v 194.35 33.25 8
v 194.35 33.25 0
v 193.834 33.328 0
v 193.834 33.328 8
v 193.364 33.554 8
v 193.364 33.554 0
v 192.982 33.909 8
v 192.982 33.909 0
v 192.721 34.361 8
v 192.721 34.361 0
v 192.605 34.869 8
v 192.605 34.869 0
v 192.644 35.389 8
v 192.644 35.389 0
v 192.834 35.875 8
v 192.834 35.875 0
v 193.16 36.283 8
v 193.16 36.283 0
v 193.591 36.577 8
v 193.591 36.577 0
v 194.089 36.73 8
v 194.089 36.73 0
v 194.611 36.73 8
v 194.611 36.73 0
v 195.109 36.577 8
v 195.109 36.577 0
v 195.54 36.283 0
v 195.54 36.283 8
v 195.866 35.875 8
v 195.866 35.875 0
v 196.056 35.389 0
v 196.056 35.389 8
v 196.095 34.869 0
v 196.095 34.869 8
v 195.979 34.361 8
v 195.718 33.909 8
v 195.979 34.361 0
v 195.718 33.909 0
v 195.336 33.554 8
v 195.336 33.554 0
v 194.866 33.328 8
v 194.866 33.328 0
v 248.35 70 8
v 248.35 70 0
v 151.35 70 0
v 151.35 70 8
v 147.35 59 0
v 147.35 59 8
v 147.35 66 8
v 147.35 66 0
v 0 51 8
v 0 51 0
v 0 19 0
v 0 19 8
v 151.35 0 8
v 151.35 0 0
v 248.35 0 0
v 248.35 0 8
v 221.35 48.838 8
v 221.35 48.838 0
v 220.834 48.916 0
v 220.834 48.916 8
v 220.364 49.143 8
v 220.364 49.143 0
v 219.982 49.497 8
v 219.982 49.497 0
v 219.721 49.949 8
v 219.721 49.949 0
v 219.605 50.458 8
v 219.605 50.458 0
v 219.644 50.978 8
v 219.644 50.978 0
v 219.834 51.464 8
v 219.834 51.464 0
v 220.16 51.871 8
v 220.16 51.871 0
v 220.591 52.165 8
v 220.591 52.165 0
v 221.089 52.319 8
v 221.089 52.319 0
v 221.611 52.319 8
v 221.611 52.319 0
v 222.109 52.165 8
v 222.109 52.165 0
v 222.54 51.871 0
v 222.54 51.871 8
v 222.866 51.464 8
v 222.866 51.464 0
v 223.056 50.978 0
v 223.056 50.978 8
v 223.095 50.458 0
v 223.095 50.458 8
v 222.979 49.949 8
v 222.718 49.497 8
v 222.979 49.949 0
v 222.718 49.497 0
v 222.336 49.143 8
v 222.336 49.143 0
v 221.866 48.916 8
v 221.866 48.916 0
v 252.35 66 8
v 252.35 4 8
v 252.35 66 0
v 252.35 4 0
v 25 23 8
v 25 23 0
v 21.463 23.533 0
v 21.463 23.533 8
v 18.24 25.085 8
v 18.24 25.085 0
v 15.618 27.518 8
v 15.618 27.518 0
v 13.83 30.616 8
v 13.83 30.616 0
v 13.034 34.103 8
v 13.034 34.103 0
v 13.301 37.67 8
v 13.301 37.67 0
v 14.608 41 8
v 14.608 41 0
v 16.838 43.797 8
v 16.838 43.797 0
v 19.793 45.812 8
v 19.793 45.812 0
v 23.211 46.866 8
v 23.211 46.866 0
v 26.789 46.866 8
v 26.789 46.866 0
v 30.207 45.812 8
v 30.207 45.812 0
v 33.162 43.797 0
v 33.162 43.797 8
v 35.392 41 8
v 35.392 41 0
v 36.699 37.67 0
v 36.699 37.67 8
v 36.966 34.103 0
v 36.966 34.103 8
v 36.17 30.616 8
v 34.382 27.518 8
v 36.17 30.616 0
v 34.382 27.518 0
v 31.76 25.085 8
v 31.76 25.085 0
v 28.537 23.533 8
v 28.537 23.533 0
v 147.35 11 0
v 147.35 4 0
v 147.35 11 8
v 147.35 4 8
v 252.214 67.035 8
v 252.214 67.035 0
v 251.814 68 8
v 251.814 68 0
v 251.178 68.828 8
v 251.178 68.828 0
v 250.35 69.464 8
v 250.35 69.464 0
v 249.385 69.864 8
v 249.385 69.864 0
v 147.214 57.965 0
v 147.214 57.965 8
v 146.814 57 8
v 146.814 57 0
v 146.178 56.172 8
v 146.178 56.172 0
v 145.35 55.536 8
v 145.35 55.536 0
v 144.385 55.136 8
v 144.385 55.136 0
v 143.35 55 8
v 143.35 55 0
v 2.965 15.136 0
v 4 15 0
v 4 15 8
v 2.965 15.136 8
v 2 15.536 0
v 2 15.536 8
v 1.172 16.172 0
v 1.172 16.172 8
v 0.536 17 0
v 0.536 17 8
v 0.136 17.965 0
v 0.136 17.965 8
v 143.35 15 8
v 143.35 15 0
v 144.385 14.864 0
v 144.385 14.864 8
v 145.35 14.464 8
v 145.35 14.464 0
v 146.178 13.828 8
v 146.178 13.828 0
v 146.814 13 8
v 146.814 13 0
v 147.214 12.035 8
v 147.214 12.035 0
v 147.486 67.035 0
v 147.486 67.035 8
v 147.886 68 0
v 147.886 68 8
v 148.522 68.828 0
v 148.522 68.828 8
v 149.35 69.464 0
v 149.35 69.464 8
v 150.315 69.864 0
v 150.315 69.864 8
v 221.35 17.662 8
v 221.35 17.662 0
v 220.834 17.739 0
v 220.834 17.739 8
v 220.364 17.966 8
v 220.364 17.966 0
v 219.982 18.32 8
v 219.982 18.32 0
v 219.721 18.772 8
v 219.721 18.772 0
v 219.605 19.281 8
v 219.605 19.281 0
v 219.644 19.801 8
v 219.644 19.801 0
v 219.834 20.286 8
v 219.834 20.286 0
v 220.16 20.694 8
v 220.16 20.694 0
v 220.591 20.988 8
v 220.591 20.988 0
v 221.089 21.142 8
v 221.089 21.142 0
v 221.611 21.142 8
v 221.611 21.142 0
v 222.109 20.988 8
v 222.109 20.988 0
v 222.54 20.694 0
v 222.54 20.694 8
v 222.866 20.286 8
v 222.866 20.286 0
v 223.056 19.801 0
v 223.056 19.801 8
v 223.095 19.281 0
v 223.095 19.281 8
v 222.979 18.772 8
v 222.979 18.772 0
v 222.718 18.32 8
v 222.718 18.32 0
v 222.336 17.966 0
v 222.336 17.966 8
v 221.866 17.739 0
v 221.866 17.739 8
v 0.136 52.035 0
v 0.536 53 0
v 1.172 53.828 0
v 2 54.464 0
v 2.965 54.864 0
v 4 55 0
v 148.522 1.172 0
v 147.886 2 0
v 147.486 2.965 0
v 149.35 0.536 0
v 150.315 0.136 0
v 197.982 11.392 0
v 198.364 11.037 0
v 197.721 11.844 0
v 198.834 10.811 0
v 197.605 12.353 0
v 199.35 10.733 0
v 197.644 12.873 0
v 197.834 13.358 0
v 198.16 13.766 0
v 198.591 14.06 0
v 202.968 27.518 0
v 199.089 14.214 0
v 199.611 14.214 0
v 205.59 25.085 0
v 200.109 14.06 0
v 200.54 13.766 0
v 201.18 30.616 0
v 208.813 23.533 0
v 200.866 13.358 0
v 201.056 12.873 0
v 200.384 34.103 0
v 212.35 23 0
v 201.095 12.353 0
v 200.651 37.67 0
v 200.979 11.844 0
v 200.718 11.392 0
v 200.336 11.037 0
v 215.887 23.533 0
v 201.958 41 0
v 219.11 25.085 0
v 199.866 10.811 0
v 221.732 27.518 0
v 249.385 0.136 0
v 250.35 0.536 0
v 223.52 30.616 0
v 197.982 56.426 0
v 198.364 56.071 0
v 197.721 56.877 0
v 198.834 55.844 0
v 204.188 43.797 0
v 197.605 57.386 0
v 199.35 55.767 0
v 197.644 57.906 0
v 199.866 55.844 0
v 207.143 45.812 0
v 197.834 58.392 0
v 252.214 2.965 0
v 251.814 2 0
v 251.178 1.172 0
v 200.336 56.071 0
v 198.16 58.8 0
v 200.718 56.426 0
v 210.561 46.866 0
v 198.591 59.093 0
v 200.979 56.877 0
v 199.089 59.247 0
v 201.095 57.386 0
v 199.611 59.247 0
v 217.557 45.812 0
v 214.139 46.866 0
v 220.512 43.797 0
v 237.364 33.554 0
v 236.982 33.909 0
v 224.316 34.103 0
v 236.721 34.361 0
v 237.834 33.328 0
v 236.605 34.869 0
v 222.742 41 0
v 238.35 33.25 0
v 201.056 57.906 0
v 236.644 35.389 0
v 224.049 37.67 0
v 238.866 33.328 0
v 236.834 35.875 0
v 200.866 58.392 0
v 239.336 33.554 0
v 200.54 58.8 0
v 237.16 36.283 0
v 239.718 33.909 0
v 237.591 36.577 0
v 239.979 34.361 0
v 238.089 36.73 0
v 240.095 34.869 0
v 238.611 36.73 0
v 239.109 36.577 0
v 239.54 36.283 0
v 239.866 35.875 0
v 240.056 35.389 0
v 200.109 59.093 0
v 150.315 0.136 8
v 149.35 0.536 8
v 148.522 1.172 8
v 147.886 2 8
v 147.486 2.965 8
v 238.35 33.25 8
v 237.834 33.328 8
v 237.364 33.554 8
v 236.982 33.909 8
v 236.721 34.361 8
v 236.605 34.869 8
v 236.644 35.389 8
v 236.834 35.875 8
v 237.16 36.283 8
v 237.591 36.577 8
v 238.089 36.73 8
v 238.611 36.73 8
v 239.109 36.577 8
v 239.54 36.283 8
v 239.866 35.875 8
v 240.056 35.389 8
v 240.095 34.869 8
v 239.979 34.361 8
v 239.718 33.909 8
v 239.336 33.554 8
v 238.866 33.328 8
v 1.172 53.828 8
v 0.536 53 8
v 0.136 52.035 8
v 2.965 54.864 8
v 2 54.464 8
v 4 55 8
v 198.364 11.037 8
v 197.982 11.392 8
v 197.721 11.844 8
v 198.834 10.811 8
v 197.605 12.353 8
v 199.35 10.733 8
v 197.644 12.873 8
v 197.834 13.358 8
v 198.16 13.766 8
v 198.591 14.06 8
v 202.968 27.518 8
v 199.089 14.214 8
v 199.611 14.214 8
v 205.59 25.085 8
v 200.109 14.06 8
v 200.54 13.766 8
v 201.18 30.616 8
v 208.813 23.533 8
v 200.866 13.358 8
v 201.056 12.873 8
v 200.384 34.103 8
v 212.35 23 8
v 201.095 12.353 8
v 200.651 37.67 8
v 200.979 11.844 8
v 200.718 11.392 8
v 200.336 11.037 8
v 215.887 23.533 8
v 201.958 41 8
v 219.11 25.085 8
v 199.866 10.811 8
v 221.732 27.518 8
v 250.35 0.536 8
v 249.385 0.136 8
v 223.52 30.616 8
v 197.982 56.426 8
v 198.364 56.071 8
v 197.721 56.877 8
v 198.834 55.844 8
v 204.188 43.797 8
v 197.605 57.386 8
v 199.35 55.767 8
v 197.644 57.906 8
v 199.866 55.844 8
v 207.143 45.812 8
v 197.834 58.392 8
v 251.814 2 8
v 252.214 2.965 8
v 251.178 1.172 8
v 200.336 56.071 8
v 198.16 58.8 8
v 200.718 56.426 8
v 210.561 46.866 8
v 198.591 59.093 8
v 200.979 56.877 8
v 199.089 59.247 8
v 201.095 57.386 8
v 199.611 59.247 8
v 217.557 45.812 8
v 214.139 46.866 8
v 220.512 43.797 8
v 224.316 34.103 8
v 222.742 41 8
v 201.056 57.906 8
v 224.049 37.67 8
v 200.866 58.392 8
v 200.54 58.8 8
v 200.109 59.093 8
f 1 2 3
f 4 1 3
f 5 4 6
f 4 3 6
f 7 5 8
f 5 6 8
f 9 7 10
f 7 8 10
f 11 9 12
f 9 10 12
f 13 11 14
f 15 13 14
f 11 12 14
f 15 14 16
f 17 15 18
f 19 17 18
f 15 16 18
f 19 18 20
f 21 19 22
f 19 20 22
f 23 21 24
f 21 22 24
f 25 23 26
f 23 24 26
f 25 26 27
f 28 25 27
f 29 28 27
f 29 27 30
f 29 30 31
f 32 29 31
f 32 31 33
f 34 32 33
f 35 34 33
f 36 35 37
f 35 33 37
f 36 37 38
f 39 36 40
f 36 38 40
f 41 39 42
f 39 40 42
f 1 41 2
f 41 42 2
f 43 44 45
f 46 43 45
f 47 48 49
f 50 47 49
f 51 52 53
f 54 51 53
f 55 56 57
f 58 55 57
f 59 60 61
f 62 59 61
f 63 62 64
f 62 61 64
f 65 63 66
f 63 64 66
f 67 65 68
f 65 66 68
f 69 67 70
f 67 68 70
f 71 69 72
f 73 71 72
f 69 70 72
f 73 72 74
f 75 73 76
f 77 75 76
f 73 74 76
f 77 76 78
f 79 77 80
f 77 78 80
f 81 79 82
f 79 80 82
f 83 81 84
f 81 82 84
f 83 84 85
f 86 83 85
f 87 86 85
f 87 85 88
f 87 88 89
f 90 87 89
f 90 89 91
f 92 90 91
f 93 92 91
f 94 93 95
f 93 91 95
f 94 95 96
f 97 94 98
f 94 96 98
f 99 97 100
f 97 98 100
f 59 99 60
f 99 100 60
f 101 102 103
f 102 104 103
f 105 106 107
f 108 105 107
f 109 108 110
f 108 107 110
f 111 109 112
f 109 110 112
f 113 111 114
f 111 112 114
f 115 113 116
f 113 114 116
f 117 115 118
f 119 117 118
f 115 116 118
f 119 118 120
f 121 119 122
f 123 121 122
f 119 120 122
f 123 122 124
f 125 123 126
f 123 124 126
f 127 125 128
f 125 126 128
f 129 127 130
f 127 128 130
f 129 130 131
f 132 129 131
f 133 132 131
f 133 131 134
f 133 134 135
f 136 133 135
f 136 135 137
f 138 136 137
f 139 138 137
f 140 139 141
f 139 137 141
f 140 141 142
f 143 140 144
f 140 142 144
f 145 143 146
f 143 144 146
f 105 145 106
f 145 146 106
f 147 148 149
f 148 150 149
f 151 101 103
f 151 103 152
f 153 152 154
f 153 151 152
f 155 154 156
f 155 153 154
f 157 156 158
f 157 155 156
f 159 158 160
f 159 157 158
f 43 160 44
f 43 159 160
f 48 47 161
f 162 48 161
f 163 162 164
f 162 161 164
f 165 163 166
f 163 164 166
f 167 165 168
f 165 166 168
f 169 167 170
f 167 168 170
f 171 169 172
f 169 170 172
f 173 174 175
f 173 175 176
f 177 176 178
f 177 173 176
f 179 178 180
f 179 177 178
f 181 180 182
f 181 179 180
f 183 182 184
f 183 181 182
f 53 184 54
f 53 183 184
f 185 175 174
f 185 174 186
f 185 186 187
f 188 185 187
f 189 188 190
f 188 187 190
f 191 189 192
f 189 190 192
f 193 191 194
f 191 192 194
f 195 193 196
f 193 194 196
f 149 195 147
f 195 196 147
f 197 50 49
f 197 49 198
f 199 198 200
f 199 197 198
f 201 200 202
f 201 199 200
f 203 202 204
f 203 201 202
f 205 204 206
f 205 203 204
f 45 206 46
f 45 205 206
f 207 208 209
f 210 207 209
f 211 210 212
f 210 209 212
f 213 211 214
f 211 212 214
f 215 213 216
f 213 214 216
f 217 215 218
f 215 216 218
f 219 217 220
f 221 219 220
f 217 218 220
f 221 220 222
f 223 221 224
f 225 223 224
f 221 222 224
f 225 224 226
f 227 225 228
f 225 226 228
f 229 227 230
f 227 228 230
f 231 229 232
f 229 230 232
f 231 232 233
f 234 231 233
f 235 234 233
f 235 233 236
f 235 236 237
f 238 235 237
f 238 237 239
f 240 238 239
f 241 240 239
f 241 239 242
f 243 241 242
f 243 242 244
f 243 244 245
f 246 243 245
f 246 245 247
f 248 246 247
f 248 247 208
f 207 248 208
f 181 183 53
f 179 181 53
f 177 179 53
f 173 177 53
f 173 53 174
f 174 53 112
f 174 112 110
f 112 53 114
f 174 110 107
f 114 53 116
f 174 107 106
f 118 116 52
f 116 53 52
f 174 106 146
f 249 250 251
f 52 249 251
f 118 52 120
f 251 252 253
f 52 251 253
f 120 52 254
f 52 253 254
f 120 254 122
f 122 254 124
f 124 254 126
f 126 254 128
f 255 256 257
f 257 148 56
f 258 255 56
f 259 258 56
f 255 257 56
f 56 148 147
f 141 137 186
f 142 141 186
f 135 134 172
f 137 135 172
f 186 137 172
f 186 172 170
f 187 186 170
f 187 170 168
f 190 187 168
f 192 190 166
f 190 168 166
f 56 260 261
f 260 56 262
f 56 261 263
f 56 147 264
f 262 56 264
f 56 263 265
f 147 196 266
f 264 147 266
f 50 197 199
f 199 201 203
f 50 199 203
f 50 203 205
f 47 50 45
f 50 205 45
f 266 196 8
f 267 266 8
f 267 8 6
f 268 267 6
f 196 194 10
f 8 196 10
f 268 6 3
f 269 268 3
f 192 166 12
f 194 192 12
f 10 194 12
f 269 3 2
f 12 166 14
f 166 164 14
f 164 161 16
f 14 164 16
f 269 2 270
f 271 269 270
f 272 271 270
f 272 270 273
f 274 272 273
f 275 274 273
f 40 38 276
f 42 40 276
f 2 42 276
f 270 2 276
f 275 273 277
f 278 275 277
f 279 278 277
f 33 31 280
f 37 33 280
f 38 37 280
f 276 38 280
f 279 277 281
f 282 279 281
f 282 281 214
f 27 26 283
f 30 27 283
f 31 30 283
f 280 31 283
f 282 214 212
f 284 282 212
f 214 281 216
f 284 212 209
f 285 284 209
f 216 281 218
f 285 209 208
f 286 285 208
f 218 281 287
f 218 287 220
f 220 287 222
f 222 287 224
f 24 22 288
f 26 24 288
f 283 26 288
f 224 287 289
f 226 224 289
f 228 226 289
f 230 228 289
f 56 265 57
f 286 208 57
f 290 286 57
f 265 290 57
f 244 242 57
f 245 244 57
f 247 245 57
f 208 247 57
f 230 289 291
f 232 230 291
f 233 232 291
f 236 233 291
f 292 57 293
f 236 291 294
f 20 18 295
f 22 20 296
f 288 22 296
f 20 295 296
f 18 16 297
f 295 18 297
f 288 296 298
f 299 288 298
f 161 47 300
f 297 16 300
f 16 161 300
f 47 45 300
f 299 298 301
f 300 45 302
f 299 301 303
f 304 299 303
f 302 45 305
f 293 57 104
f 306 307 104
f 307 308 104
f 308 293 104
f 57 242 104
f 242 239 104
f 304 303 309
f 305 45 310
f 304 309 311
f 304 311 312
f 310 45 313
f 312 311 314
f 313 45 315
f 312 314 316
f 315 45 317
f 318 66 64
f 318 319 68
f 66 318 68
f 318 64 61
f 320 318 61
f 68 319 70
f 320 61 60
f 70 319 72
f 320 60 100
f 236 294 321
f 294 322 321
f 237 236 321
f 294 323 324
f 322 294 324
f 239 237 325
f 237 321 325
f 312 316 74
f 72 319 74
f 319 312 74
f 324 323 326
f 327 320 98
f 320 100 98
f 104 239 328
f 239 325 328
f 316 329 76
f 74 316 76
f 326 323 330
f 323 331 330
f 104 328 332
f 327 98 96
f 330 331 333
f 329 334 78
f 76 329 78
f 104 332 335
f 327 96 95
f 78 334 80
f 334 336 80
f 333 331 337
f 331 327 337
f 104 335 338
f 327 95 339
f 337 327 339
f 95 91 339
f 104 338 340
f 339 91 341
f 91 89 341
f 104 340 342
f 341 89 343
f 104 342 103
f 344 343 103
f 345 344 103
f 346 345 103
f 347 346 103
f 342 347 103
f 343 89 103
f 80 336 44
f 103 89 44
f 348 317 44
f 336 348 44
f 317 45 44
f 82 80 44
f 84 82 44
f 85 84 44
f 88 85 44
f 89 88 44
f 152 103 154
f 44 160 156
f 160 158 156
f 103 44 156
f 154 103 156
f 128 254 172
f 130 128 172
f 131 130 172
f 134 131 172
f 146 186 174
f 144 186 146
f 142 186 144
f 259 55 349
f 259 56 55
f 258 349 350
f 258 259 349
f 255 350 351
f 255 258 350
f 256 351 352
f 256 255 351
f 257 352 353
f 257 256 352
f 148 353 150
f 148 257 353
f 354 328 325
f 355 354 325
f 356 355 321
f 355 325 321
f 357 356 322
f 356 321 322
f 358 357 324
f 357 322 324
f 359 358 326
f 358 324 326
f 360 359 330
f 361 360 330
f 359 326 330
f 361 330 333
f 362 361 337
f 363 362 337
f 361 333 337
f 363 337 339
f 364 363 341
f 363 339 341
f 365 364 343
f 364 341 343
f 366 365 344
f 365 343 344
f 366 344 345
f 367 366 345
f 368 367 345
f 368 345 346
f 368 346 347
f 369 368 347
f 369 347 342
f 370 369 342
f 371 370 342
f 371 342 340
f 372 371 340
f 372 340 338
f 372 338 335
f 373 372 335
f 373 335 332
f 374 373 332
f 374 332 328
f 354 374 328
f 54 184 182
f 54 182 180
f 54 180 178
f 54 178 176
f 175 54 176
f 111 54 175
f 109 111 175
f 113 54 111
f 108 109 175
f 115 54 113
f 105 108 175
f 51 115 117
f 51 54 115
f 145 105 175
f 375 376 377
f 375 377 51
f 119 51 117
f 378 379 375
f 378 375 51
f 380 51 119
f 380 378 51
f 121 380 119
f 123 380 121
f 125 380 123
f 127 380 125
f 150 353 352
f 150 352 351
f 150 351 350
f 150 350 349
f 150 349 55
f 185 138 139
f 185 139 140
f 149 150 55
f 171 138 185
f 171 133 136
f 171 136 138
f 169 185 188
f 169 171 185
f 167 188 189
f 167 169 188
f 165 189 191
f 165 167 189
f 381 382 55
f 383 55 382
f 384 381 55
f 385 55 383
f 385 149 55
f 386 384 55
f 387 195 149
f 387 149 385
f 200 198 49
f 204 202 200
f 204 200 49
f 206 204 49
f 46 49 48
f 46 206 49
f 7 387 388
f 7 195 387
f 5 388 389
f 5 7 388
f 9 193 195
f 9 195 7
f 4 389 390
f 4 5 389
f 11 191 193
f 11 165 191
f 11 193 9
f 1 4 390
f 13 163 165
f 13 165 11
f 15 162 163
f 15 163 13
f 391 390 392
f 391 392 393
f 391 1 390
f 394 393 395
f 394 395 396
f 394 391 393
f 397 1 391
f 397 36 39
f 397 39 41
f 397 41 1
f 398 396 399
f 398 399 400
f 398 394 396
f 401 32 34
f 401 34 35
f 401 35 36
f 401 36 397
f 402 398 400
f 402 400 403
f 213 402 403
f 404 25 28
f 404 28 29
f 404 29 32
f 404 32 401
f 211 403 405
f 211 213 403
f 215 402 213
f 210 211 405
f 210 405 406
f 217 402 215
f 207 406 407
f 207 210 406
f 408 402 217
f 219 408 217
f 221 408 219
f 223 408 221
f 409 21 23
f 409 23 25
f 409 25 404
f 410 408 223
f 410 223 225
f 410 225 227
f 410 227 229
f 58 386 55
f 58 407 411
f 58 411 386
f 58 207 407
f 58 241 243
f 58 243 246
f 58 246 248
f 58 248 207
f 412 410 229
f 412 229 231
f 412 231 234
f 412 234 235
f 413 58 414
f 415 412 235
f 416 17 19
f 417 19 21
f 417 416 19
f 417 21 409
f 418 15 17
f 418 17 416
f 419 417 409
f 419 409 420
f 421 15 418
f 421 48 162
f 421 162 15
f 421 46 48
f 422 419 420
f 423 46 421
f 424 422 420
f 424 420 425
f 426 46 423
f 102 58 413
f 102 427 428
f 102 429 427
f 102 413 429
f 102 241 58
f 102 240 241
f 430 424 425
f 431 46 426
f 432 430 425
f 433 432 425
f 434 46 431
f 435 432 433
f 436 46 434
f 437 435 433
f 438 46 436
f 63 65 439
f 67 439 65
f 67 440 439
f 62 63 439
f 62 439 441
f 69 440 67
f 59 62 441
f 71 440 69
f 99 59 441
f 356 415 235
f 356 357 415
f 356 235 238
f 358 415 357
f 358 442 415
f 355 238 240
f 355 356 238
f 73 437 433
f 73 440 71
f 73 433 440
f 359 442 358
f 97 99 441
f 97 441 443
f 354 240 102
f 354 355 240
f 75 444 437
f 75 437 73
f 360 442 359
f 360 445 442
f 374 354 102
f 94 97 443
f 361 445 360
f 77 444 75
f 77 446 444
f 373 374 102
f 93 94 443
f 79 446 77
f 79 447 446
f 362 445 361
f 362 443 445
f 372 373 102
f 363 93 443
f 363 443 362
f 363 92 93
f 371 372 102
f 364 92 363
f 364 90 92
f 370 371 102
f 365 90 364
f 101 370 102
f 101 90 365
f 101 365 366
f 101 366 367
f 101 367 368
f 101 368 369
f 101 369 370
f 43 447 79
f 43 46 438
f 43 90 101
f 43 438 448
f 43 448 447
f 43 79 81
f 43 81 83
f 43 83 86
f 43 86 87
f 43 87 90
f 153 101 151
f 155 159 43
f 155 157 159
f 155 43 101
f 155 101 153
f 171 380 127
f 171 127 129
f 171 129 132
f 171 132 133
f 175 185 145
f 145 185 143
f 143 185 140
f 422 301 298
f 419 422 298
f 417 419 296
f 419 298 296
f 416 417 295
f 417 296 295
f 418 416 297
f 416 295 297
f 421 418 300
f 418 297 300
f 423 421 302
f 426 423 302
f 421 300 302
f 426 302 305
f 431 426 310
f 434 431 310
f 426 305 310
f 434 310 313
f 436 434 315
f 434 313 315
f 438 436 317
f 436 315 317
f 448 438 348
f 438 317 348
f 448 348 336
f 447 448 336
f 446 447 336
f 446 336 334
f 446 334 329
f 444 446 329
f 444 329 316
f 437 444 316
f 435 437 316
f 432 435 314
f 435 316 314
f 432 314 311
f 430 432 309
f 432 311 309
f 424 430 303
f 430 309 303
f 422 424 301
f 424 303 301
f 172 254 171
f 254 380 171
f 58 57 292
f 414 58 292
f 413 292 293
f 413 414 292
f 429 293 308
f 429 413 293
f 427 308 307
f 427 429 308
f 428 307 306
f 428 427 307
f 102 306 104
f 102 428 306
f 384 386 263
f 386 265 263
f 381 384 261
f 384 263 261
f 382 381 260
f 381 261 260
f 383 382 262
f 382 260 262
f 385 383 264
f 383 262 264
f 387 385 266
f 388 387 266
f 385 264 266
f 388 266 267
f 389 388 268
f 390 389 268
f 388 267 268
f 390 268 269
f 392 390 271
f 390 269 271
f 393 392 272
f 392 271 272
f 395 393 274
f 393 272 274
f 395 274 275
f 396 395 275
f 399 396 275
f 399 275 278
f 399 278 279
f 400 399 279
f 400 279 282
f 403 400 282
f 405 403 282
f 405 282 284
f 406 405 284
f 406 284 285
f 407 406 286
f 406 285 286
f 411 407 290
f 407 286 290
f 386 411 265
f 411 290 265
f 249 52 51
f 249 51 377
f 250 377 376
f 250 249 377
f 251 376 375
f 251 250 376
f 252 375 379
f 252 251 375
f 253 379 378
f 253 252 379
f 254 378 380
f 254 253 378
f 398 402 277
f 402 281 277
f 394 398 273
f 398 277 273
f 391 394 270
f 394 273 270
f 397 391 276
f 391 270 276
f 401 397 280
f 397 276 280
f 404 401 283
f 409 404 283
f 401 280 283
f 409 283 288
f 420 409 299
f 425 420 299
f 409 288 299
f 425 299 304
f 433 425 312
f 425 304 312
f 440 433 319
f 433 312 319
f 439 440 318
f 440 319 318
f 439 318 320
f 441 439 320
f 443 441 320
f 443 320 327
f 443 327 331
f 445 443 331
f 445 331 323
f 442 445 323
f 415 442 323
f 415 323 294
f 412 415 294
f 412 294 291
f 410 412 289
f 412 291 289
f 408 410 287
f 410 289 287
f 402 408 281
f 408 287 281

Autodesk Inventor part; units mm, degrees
ref_plane "YZ Plane" through (0, 0, 0) normal (1, 0, 0) x (0, 1, 0)
ref_plane "XZ Plane" through (0, 0, 0) normal (0, 1, 0) x (-1, 0, 0)
ref_plane "XY Plane" through (0, 0, 0) normal (0, 0, 1) x (1, 0, 0)
sketch "スケッチ1" plane through (0, 0, 0) normal (0, 0, 1) x (1, 0, 0)
  line L0 (0, 0) -> (252.35, 0)
  line L1 (252.35, 0) -> (252.35, 70)
  line L2 (252.35, 70) -> (0, 70)
  line L3 (0, 70) -> (0, 0)
  dimension "d0" = 70
  dimension "d1" = 252.35
extrude "押し出し1" add sketch "スケッチ1" along normal blind 8
sketch "スケッチ2" plane through (0, 0, 8) normal (0, 0, 1) x (1, 0, 0)
  line L0 (0, 0) -> (252.35, 0) projected
  line L1 (0, 70) -> (0, 0) projected
  point P0 (25, 35)
  dimension "d4" = 35
  dimension "d5" = 25
hole "穴1" at (25, 35, 8) direction (0, 0, -1) diameter 24 end through all
sketch "スケッチ3" plane through (0, 0, 8) normal (0, 0, 1) x (1, 0, 0)
  line L0 (252.35, 0) -> (252.35, 70) projected
  circle A0 centre (25, 35) radius 12 projected
  line L1 (0, 0) -> (252.35, 0) projected
  point P0 (212.35, 35)
  dimension "d14" = 187.35
  dimension "d15" = 35
hole "穴2" at (212.35, 35, 8) direction (0, 0, -1) diameter 24 end through all
sketch "スケッチ4" plane through (0, 0, 8) normal (0, 0, 1) x (1, 0, 0)
  line L0 (252.35, 0) -> (252.35, 70) projected
  line L1 (0, 70) -> (0, 0) projected
  line L2 (252.35, 70) -> (0, 70) projected
  line L3 (0, 0) -> (252.35, 0) projected
  line L4 (0, 55) -> (147.35, 55)
  line L5 (0, 15) -> (147.35, 15)
  line L6 (147.35, 0) -> (147.35, 15)
  line L7 (147.35, 55) -> (147.35, 70)
  line L8 (147.35, 55) -> (0, 55)
  line L9 (0, 55) -> (0, 70)
  line L10 (0, 70) -> (147.35, 70)
  line L11 (147.35, 70) -> (147.35, 55)
  line L12 (147.35, 15) -> (0, 15)
  line L13 (0, 15) -> (0, 0)
  line L14 (0, 0) -> (147.35, 0)
  line L15 (147.35, 0) -> (147.35, 15)
  dimension "d24" = 15
  dimension "d25" = 15
extrude "押し出し2" cut sketch "スケッチ4" against normal blind 10 contours L3 L1 L5 L6 | L7 L4 L1 L2
fillet "フィレット1" radius 4 2 edges at (147.35, 15, 4) (147.35, 55, 4)
sketch "スケッチ5" plane through (0, 0, 8) normal (0, 0, 1) x (1, 0, 0)
  line L0 (147.35, 0) -> (252.35, 0) projected
  circle A0 centre (212.35, 35) radius 12 projected
  point P0 (0, 0)
  point P1 (238.35, 35)
  point P2 (199.35, 57.5167)
  point P3 (199.35, 12.4833)
  dimension "d29" = 35
  dimension "d30" = 26
  dimension "d33" = 360
hole "穴3" at (238.35, 35, 8) at (199.35, 57.5167, 8) at (199.35, 12.4833, 8) direction (0, 0, -1) diameter 3.5 end through all
sketch "スケッチ6" plane through (0, 0, 8) normal (0, 0, 1) x (1, 0, 0)
  circle A0 centre (212.35, 35) radius 12 projected
  line L0 (147.35, 0) -> (252.35, 0) projected
  point P0 (0, 0)
  point P1 (194.35, 35)
  point P2 (221.35, 19.4115)
  point P3 (221.35, 50.5885)
  dimension "d42" = 18
  dimension "d43" = 35
  dimension "d46" = 360
hole "穴4" at (194.35, 35, 8) at (221.35, 19.4115, 8) at (221.35, 50.5885, 8) direction (0, 0, -1) diameter 3.5 end through all
fillet "フィレット2" radius 4 6 edges at (0, 55, 4) (0, 15, 4) (147.35, 0, 4) (147.35, 70, 4) (252.35, 70, 4) (252.35, 0, 4)
properties part number "タイヤアーム"
